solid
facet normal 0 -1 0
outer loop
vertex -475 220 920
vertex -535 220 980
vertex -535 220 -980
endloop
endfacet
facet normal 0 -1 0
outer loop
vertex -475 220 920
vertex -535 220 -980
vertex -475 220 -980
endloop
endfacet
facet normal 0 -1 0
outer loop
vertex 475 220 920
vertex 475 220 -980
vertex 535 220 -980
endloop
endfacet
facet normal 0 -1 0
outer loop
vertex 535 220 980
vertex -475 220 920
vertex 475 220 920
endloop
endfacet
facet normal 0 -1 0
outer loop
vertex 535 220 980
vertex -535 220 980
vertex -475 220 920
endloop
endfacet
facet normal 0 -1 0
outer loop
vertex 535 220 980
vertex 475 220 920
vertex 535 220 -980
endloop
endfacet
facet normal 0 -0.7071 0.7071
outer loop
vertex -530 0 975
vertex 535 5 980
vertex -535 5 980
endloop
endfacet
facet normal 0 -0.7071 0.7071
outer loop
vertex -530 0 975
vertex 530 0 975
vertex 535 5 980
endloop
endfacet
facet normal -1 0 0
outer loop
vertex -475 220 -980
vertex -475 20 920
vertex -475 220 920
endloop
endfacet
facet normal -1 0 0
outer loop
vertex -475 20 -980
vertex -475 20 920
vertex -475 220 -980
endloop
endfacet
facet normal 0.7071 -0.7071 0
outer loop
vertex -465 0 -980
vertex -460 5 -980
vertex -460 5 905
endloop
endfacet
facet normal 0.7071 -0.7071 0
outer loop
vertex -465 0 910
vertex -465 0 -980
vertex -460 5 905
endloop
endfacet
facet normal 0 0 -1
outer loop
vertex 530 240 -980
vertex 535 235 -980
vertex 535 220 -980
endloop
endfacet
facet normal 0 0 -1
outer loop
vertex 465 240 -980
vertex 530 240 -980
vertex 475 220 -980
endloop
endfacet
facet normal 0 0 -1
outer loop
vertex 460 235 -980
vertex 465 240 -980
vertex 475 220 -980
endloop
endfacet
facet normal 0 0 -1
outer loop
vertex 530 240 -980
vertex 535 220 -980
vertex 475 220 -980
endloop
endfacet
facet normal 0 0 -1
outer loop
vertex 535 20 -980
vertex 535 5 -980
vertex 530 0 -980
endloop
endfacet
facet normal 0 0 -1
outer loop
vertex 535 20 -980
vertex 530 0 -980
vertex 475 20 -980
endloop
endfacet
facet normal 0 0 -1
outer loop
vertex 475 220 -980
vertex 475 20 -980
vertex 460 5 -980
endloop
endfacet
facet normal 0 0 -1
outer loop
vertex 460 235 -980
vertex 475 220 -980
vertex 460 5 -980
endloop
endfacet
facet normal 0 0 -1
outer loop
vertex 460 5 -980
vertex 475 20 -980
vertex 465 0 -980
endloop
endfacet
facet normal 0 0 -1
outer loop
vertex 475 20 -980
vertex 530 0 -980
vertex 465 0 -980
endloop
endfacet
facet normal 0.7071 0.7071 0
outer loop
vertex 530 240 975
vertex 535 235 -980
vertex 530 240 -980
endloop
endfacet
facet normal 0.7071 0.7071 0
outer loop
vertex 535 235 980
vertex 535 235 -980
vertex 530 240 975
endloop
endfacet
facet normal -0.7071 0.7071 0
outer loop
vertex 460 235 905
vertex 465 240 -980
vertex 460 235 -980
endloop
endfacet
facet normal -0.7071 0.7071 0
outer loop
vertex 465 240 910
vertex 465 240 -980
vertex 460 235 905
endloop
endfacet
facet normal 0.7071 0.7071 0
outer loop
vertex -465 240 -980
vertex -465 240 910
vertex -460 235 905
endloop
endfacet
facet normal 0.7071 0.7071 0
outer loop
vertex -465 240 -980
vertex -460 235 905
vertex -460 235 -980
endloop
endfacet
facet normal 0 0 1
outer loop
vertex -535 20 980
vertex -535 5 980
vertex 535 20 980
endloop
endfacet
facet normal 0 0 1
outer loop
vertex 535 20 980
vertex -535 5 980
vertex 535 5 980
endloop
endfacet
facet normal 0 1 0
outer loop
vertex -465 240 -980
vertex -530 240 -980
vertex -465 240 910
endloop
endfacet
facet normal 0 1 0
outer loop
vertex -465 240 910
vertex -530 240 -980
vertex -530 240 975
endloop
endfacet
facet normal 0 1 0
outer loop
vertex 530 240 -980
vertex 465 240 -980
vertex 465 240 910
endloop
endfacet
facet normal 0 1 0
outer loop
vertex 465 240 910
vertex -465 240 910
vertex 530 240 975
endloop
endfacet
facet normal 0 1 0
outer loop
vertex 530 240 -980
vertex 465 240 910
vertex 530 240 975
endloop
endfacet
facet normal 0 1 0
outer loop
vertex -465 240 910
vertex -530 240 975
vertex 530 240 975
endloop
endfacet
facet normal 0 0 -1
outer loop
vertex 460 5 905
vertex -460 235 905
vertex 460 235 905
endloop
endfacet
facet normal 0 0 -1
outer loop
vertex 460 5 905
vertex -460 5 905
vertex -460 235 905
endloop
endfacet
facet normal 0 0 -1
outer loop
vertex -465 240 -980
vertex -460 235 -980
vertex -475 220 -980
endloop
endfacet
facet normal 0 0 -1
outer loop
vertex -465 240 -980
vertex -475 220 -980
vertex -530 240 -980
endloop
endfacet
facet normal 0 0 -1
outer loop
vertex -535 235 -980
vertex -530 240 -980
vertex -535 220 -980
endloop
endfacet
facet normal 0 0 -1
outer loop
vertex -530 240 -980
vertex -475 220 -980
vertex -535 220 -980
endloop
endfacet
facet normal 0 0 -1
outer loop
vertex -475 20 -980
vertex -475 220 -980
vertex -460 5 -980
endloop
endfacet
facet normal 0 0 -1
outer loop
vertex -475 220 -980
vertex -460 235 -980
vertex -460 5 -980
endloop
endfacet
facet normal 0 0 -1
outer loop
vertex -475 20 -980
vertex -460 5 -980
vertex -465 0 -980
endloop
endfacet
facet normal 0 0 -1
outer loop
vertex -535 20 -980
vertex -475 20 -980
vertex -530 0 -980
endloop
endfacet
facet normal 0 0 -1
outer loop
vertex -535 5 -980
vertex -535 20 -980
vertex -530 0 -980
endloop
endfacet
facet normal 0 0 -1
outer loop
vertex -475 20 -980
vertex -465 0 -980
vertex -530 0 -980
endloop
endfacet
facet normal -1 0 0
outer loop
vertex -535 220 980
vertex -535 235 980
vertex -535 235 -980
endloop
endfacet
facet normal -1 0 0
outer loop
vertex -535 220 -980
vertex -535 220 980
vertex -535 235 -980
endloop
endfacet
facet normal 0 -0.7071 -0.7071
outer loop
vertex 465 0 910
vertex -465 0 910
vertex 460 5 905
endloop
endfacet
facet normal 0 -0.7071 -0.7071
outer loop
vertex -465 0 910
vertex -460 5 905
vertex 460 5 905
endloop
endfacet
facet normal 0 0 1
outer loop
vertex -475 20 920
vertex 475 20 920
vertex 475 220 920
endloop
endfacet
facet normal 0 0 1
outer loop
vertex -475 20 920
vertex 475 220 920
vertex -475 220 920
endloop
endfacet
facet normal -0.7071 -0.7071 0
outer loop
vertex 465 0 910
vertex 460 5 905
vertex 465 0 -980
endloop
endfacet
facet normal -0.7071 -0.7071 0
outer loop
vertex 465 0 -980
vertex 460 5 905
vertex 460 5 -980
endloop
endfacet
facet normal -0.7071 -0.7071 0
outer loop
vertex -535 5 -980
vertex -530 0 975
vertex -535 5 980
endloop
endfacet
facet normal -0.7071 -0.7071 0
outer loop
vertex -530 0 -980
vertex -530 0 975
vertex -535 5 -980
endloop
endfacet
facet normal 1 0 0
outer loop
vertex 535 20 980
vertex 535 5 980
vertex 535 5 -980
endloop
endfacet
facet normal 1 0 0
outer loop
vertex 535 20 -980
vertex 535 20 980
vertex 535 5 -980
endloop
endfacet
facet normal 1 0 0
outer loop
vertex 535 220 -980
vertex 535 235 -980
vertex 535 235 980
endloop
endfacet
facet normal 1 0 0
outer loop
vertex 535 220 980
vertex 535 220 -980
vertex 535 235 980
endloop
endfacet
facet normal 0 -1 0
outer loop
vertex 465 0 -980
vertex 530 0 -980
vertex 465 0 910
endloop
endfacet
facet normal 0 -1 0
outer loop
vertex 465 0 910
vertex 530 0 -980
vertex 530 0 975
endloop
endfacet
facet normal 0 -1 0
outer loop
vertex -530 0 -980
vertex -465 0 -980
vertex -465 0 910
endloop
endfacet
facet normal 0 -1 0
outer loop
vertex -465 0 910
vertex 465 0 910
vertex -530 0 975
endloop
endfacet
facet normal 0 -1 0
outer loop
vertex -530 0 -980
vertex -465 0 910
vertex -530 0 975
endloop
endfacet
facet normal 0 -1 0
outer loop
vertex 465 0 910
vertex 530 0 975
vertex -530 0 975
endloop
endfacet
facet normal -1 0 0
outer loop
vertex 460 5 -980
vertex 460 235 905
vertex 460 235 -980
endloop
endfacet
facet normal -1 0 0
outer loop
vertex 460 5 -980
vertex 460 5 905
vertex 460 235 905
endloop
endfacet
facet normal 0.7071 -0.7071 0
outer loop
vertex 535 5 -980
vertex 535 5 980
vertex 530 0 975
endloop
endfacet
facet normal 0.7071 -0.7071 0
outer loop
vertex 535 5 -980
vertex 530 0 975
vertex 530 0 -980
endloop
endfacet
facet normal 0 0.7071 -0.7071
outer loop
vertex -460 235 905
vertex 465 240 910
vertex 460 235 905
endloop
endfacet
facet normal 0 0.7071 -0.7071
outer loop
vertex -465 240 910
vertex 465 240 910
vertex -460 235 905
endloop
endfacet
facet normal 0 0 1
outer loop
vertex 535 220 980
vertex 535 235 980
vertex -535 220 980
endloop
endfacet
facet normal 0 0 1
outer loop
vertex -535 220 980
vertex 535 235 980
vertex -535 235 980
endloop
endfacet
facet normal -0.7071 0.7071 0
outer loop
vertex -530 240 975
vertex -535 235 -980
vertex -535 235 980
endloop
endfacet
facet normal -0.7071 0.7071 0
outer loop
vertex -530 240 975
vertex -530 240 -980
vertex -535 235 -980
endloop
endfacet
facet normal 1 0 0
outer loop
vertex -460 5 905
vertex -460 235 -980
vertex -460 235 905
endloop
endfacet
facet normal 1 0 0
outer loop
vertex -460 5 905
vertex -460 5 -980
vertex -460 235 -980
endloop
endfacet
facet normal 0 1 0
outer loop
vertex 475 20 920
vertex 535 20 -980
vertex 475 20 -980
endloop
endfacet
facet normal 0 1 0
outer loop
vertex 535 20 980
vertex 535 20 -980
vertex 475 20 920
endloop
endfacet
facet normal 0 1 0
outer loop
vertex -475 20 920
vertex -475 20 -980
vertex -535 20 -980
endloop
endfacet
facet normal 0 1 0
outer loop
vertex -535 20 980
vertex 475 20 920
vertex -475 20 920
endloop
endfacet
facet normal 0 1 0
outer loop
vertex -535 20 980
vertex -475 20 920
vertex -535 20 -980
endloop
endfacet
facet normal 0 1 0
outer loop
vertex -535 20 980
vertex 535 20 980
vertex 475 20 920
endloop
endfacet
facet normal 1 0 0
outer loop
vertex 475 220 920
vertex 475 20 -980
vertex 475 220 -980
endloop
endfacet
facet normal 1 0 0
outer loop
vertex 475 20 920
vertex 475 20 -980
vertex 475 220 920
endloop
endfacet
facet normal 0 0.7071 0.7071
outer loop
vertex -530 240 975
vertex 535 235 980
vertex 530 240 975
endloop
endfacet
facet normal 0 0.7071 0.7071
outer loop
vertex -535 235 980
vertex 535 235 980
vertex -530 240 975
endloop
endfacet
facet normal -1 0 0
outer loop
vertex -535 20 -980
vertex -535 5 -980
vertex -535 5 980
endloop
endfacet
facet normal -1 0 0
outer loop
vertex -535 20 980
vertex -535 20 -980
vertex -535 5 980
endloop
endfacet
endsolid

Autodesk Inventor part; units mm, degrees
ref_plane "YZ Plane" through (0, 0, 0) normal (1, 0, 0) x (0, 1, 0)
ref_plane "XZ Plane" through (0, 0, 0) normal (0, 1, 0) x (-1, 0, 0)
ref_plane "XY Plane" through (0, 0, 0) normal (0, 0, 1) x (1, 0, 0)
sketch "Skizze1" plane through (0, 0, 0) normal (0, 1, 0) x (-1, 0, 0)
  line L0 (475, 920) -> (-475, 920) construction
  line L1 (-475, 920) -> (-475, -980) construction
  line L2 (475, -980) -> (475, 920) construction
  line L3 (749, 0) -> (-749, 0) projected
  line L4 (0, -1372) -> (0, 1372) projected
  line L5 (535, 980) -> (-535, 980)
  line L6 (-535, 980) -> (-535, -980)
  line L7 (535, -980) -> (535, 980)
  line L8 (-535, -980) -> (-475, -980)
  line L9 (475, -980) -> (535, -980)
  line L10 (460, 905) -> (-460, 905)
  line L11 (-460, 905) -> (-460, -980)
  line L12 (460, -980) -> (460, 905)
  line L13 (-475, -980) -> (-460, -980)
  line L14 (460, -980) -> (475, -980)
  dimension "d0" = 1900
  dimension "d1" = 950
  dimension "d2" = 60
  dimension "d3" = 60
  dimension "d4" = 60
  dimension "d7" = 15
  dimension "d8" = 15
  dimension "d9" = 15
extrude "Extrusion1" add sketch "Skizze1" along normal blind 20 contours L7 L9 L14 L12 L3 | L3 L12 L10 L4 L5 L7 | L4 L10 L11 L3 L6 L5 | L11 L13 L8 L6 L3
sketch "Skizze2" plane through (0, 20, 0) normal (0, 1, 0) x (1, 0, 0)
  line L0 (-535, -980) -> (535, -980) projected
  line L1 (535, -980) -> (535, 980) projected
  line L2 (535, 980) -> (460, 980) projected
  line L3 (460, 980) -> (460, -905) projected
  line L4 (460, -905) -> (-460, -905) projected
  line L5 (-460, -905) -> (-460, 980) projected
  line L6 (-460, 980) -> (-535, 980) projected
  line L7 (-535, 980) -> (-535, -980) projected
  line L8 (535, 980) -> (460, 980) projected
  line L9 (475, 980) -> (475, -920)
  line L10 (475, -920) -> (-475, -920)
  line L11 (-475, -920) -> (-475, 980)
  line L12 (0, 1372) -> (0, -1372) projected
  line L13 (-749, 0) -> (749, 0) projected
  line L14 (460, 980) -> (460, -905) projected
  line L15 (475, 980) -> (460, 980)
  line L16 (460, -905) -> (-460, -905) projected
  line L17 (460, 980) -> (460, -905)
  line L18 (460, -905) -> (-460, -905)
  line L19 (-460, -905) -> (-460, 980)
  line L20 (-460, 980) -> (-535, 980) projected
  line L21 (-475, 980) -> (-460, 980)
  dimension "d10" = 950
  dimension "d11" = 1900
extrude "Extrusion2" add sketch "Skizze2" along normal blind 100 contours L12 L4 L3 L13 L9 L10 | L10 L11 L13 L5 L4 L12 | L11 L6 L5 L13 | L13 L3 L2 L9
chamfer "Fase1" distance 5 angle 45 6 edges at (-460, 0, -37.5) (0, 0, 905) (460, 0, -37.5) (0, 0, 980) (535, 0, 0) (-535, 0, 0)
mirror "Spiegeln1" about plane through (0, 120, 150.1399) normal (0, 1, 0) of "Extrusion1", "Extrusion2", "Fase1"
equation "\"d3\" = d2"
equation "\"d4\" = d2"
properties part number "Rahmen" material "Holz (Birke)"
